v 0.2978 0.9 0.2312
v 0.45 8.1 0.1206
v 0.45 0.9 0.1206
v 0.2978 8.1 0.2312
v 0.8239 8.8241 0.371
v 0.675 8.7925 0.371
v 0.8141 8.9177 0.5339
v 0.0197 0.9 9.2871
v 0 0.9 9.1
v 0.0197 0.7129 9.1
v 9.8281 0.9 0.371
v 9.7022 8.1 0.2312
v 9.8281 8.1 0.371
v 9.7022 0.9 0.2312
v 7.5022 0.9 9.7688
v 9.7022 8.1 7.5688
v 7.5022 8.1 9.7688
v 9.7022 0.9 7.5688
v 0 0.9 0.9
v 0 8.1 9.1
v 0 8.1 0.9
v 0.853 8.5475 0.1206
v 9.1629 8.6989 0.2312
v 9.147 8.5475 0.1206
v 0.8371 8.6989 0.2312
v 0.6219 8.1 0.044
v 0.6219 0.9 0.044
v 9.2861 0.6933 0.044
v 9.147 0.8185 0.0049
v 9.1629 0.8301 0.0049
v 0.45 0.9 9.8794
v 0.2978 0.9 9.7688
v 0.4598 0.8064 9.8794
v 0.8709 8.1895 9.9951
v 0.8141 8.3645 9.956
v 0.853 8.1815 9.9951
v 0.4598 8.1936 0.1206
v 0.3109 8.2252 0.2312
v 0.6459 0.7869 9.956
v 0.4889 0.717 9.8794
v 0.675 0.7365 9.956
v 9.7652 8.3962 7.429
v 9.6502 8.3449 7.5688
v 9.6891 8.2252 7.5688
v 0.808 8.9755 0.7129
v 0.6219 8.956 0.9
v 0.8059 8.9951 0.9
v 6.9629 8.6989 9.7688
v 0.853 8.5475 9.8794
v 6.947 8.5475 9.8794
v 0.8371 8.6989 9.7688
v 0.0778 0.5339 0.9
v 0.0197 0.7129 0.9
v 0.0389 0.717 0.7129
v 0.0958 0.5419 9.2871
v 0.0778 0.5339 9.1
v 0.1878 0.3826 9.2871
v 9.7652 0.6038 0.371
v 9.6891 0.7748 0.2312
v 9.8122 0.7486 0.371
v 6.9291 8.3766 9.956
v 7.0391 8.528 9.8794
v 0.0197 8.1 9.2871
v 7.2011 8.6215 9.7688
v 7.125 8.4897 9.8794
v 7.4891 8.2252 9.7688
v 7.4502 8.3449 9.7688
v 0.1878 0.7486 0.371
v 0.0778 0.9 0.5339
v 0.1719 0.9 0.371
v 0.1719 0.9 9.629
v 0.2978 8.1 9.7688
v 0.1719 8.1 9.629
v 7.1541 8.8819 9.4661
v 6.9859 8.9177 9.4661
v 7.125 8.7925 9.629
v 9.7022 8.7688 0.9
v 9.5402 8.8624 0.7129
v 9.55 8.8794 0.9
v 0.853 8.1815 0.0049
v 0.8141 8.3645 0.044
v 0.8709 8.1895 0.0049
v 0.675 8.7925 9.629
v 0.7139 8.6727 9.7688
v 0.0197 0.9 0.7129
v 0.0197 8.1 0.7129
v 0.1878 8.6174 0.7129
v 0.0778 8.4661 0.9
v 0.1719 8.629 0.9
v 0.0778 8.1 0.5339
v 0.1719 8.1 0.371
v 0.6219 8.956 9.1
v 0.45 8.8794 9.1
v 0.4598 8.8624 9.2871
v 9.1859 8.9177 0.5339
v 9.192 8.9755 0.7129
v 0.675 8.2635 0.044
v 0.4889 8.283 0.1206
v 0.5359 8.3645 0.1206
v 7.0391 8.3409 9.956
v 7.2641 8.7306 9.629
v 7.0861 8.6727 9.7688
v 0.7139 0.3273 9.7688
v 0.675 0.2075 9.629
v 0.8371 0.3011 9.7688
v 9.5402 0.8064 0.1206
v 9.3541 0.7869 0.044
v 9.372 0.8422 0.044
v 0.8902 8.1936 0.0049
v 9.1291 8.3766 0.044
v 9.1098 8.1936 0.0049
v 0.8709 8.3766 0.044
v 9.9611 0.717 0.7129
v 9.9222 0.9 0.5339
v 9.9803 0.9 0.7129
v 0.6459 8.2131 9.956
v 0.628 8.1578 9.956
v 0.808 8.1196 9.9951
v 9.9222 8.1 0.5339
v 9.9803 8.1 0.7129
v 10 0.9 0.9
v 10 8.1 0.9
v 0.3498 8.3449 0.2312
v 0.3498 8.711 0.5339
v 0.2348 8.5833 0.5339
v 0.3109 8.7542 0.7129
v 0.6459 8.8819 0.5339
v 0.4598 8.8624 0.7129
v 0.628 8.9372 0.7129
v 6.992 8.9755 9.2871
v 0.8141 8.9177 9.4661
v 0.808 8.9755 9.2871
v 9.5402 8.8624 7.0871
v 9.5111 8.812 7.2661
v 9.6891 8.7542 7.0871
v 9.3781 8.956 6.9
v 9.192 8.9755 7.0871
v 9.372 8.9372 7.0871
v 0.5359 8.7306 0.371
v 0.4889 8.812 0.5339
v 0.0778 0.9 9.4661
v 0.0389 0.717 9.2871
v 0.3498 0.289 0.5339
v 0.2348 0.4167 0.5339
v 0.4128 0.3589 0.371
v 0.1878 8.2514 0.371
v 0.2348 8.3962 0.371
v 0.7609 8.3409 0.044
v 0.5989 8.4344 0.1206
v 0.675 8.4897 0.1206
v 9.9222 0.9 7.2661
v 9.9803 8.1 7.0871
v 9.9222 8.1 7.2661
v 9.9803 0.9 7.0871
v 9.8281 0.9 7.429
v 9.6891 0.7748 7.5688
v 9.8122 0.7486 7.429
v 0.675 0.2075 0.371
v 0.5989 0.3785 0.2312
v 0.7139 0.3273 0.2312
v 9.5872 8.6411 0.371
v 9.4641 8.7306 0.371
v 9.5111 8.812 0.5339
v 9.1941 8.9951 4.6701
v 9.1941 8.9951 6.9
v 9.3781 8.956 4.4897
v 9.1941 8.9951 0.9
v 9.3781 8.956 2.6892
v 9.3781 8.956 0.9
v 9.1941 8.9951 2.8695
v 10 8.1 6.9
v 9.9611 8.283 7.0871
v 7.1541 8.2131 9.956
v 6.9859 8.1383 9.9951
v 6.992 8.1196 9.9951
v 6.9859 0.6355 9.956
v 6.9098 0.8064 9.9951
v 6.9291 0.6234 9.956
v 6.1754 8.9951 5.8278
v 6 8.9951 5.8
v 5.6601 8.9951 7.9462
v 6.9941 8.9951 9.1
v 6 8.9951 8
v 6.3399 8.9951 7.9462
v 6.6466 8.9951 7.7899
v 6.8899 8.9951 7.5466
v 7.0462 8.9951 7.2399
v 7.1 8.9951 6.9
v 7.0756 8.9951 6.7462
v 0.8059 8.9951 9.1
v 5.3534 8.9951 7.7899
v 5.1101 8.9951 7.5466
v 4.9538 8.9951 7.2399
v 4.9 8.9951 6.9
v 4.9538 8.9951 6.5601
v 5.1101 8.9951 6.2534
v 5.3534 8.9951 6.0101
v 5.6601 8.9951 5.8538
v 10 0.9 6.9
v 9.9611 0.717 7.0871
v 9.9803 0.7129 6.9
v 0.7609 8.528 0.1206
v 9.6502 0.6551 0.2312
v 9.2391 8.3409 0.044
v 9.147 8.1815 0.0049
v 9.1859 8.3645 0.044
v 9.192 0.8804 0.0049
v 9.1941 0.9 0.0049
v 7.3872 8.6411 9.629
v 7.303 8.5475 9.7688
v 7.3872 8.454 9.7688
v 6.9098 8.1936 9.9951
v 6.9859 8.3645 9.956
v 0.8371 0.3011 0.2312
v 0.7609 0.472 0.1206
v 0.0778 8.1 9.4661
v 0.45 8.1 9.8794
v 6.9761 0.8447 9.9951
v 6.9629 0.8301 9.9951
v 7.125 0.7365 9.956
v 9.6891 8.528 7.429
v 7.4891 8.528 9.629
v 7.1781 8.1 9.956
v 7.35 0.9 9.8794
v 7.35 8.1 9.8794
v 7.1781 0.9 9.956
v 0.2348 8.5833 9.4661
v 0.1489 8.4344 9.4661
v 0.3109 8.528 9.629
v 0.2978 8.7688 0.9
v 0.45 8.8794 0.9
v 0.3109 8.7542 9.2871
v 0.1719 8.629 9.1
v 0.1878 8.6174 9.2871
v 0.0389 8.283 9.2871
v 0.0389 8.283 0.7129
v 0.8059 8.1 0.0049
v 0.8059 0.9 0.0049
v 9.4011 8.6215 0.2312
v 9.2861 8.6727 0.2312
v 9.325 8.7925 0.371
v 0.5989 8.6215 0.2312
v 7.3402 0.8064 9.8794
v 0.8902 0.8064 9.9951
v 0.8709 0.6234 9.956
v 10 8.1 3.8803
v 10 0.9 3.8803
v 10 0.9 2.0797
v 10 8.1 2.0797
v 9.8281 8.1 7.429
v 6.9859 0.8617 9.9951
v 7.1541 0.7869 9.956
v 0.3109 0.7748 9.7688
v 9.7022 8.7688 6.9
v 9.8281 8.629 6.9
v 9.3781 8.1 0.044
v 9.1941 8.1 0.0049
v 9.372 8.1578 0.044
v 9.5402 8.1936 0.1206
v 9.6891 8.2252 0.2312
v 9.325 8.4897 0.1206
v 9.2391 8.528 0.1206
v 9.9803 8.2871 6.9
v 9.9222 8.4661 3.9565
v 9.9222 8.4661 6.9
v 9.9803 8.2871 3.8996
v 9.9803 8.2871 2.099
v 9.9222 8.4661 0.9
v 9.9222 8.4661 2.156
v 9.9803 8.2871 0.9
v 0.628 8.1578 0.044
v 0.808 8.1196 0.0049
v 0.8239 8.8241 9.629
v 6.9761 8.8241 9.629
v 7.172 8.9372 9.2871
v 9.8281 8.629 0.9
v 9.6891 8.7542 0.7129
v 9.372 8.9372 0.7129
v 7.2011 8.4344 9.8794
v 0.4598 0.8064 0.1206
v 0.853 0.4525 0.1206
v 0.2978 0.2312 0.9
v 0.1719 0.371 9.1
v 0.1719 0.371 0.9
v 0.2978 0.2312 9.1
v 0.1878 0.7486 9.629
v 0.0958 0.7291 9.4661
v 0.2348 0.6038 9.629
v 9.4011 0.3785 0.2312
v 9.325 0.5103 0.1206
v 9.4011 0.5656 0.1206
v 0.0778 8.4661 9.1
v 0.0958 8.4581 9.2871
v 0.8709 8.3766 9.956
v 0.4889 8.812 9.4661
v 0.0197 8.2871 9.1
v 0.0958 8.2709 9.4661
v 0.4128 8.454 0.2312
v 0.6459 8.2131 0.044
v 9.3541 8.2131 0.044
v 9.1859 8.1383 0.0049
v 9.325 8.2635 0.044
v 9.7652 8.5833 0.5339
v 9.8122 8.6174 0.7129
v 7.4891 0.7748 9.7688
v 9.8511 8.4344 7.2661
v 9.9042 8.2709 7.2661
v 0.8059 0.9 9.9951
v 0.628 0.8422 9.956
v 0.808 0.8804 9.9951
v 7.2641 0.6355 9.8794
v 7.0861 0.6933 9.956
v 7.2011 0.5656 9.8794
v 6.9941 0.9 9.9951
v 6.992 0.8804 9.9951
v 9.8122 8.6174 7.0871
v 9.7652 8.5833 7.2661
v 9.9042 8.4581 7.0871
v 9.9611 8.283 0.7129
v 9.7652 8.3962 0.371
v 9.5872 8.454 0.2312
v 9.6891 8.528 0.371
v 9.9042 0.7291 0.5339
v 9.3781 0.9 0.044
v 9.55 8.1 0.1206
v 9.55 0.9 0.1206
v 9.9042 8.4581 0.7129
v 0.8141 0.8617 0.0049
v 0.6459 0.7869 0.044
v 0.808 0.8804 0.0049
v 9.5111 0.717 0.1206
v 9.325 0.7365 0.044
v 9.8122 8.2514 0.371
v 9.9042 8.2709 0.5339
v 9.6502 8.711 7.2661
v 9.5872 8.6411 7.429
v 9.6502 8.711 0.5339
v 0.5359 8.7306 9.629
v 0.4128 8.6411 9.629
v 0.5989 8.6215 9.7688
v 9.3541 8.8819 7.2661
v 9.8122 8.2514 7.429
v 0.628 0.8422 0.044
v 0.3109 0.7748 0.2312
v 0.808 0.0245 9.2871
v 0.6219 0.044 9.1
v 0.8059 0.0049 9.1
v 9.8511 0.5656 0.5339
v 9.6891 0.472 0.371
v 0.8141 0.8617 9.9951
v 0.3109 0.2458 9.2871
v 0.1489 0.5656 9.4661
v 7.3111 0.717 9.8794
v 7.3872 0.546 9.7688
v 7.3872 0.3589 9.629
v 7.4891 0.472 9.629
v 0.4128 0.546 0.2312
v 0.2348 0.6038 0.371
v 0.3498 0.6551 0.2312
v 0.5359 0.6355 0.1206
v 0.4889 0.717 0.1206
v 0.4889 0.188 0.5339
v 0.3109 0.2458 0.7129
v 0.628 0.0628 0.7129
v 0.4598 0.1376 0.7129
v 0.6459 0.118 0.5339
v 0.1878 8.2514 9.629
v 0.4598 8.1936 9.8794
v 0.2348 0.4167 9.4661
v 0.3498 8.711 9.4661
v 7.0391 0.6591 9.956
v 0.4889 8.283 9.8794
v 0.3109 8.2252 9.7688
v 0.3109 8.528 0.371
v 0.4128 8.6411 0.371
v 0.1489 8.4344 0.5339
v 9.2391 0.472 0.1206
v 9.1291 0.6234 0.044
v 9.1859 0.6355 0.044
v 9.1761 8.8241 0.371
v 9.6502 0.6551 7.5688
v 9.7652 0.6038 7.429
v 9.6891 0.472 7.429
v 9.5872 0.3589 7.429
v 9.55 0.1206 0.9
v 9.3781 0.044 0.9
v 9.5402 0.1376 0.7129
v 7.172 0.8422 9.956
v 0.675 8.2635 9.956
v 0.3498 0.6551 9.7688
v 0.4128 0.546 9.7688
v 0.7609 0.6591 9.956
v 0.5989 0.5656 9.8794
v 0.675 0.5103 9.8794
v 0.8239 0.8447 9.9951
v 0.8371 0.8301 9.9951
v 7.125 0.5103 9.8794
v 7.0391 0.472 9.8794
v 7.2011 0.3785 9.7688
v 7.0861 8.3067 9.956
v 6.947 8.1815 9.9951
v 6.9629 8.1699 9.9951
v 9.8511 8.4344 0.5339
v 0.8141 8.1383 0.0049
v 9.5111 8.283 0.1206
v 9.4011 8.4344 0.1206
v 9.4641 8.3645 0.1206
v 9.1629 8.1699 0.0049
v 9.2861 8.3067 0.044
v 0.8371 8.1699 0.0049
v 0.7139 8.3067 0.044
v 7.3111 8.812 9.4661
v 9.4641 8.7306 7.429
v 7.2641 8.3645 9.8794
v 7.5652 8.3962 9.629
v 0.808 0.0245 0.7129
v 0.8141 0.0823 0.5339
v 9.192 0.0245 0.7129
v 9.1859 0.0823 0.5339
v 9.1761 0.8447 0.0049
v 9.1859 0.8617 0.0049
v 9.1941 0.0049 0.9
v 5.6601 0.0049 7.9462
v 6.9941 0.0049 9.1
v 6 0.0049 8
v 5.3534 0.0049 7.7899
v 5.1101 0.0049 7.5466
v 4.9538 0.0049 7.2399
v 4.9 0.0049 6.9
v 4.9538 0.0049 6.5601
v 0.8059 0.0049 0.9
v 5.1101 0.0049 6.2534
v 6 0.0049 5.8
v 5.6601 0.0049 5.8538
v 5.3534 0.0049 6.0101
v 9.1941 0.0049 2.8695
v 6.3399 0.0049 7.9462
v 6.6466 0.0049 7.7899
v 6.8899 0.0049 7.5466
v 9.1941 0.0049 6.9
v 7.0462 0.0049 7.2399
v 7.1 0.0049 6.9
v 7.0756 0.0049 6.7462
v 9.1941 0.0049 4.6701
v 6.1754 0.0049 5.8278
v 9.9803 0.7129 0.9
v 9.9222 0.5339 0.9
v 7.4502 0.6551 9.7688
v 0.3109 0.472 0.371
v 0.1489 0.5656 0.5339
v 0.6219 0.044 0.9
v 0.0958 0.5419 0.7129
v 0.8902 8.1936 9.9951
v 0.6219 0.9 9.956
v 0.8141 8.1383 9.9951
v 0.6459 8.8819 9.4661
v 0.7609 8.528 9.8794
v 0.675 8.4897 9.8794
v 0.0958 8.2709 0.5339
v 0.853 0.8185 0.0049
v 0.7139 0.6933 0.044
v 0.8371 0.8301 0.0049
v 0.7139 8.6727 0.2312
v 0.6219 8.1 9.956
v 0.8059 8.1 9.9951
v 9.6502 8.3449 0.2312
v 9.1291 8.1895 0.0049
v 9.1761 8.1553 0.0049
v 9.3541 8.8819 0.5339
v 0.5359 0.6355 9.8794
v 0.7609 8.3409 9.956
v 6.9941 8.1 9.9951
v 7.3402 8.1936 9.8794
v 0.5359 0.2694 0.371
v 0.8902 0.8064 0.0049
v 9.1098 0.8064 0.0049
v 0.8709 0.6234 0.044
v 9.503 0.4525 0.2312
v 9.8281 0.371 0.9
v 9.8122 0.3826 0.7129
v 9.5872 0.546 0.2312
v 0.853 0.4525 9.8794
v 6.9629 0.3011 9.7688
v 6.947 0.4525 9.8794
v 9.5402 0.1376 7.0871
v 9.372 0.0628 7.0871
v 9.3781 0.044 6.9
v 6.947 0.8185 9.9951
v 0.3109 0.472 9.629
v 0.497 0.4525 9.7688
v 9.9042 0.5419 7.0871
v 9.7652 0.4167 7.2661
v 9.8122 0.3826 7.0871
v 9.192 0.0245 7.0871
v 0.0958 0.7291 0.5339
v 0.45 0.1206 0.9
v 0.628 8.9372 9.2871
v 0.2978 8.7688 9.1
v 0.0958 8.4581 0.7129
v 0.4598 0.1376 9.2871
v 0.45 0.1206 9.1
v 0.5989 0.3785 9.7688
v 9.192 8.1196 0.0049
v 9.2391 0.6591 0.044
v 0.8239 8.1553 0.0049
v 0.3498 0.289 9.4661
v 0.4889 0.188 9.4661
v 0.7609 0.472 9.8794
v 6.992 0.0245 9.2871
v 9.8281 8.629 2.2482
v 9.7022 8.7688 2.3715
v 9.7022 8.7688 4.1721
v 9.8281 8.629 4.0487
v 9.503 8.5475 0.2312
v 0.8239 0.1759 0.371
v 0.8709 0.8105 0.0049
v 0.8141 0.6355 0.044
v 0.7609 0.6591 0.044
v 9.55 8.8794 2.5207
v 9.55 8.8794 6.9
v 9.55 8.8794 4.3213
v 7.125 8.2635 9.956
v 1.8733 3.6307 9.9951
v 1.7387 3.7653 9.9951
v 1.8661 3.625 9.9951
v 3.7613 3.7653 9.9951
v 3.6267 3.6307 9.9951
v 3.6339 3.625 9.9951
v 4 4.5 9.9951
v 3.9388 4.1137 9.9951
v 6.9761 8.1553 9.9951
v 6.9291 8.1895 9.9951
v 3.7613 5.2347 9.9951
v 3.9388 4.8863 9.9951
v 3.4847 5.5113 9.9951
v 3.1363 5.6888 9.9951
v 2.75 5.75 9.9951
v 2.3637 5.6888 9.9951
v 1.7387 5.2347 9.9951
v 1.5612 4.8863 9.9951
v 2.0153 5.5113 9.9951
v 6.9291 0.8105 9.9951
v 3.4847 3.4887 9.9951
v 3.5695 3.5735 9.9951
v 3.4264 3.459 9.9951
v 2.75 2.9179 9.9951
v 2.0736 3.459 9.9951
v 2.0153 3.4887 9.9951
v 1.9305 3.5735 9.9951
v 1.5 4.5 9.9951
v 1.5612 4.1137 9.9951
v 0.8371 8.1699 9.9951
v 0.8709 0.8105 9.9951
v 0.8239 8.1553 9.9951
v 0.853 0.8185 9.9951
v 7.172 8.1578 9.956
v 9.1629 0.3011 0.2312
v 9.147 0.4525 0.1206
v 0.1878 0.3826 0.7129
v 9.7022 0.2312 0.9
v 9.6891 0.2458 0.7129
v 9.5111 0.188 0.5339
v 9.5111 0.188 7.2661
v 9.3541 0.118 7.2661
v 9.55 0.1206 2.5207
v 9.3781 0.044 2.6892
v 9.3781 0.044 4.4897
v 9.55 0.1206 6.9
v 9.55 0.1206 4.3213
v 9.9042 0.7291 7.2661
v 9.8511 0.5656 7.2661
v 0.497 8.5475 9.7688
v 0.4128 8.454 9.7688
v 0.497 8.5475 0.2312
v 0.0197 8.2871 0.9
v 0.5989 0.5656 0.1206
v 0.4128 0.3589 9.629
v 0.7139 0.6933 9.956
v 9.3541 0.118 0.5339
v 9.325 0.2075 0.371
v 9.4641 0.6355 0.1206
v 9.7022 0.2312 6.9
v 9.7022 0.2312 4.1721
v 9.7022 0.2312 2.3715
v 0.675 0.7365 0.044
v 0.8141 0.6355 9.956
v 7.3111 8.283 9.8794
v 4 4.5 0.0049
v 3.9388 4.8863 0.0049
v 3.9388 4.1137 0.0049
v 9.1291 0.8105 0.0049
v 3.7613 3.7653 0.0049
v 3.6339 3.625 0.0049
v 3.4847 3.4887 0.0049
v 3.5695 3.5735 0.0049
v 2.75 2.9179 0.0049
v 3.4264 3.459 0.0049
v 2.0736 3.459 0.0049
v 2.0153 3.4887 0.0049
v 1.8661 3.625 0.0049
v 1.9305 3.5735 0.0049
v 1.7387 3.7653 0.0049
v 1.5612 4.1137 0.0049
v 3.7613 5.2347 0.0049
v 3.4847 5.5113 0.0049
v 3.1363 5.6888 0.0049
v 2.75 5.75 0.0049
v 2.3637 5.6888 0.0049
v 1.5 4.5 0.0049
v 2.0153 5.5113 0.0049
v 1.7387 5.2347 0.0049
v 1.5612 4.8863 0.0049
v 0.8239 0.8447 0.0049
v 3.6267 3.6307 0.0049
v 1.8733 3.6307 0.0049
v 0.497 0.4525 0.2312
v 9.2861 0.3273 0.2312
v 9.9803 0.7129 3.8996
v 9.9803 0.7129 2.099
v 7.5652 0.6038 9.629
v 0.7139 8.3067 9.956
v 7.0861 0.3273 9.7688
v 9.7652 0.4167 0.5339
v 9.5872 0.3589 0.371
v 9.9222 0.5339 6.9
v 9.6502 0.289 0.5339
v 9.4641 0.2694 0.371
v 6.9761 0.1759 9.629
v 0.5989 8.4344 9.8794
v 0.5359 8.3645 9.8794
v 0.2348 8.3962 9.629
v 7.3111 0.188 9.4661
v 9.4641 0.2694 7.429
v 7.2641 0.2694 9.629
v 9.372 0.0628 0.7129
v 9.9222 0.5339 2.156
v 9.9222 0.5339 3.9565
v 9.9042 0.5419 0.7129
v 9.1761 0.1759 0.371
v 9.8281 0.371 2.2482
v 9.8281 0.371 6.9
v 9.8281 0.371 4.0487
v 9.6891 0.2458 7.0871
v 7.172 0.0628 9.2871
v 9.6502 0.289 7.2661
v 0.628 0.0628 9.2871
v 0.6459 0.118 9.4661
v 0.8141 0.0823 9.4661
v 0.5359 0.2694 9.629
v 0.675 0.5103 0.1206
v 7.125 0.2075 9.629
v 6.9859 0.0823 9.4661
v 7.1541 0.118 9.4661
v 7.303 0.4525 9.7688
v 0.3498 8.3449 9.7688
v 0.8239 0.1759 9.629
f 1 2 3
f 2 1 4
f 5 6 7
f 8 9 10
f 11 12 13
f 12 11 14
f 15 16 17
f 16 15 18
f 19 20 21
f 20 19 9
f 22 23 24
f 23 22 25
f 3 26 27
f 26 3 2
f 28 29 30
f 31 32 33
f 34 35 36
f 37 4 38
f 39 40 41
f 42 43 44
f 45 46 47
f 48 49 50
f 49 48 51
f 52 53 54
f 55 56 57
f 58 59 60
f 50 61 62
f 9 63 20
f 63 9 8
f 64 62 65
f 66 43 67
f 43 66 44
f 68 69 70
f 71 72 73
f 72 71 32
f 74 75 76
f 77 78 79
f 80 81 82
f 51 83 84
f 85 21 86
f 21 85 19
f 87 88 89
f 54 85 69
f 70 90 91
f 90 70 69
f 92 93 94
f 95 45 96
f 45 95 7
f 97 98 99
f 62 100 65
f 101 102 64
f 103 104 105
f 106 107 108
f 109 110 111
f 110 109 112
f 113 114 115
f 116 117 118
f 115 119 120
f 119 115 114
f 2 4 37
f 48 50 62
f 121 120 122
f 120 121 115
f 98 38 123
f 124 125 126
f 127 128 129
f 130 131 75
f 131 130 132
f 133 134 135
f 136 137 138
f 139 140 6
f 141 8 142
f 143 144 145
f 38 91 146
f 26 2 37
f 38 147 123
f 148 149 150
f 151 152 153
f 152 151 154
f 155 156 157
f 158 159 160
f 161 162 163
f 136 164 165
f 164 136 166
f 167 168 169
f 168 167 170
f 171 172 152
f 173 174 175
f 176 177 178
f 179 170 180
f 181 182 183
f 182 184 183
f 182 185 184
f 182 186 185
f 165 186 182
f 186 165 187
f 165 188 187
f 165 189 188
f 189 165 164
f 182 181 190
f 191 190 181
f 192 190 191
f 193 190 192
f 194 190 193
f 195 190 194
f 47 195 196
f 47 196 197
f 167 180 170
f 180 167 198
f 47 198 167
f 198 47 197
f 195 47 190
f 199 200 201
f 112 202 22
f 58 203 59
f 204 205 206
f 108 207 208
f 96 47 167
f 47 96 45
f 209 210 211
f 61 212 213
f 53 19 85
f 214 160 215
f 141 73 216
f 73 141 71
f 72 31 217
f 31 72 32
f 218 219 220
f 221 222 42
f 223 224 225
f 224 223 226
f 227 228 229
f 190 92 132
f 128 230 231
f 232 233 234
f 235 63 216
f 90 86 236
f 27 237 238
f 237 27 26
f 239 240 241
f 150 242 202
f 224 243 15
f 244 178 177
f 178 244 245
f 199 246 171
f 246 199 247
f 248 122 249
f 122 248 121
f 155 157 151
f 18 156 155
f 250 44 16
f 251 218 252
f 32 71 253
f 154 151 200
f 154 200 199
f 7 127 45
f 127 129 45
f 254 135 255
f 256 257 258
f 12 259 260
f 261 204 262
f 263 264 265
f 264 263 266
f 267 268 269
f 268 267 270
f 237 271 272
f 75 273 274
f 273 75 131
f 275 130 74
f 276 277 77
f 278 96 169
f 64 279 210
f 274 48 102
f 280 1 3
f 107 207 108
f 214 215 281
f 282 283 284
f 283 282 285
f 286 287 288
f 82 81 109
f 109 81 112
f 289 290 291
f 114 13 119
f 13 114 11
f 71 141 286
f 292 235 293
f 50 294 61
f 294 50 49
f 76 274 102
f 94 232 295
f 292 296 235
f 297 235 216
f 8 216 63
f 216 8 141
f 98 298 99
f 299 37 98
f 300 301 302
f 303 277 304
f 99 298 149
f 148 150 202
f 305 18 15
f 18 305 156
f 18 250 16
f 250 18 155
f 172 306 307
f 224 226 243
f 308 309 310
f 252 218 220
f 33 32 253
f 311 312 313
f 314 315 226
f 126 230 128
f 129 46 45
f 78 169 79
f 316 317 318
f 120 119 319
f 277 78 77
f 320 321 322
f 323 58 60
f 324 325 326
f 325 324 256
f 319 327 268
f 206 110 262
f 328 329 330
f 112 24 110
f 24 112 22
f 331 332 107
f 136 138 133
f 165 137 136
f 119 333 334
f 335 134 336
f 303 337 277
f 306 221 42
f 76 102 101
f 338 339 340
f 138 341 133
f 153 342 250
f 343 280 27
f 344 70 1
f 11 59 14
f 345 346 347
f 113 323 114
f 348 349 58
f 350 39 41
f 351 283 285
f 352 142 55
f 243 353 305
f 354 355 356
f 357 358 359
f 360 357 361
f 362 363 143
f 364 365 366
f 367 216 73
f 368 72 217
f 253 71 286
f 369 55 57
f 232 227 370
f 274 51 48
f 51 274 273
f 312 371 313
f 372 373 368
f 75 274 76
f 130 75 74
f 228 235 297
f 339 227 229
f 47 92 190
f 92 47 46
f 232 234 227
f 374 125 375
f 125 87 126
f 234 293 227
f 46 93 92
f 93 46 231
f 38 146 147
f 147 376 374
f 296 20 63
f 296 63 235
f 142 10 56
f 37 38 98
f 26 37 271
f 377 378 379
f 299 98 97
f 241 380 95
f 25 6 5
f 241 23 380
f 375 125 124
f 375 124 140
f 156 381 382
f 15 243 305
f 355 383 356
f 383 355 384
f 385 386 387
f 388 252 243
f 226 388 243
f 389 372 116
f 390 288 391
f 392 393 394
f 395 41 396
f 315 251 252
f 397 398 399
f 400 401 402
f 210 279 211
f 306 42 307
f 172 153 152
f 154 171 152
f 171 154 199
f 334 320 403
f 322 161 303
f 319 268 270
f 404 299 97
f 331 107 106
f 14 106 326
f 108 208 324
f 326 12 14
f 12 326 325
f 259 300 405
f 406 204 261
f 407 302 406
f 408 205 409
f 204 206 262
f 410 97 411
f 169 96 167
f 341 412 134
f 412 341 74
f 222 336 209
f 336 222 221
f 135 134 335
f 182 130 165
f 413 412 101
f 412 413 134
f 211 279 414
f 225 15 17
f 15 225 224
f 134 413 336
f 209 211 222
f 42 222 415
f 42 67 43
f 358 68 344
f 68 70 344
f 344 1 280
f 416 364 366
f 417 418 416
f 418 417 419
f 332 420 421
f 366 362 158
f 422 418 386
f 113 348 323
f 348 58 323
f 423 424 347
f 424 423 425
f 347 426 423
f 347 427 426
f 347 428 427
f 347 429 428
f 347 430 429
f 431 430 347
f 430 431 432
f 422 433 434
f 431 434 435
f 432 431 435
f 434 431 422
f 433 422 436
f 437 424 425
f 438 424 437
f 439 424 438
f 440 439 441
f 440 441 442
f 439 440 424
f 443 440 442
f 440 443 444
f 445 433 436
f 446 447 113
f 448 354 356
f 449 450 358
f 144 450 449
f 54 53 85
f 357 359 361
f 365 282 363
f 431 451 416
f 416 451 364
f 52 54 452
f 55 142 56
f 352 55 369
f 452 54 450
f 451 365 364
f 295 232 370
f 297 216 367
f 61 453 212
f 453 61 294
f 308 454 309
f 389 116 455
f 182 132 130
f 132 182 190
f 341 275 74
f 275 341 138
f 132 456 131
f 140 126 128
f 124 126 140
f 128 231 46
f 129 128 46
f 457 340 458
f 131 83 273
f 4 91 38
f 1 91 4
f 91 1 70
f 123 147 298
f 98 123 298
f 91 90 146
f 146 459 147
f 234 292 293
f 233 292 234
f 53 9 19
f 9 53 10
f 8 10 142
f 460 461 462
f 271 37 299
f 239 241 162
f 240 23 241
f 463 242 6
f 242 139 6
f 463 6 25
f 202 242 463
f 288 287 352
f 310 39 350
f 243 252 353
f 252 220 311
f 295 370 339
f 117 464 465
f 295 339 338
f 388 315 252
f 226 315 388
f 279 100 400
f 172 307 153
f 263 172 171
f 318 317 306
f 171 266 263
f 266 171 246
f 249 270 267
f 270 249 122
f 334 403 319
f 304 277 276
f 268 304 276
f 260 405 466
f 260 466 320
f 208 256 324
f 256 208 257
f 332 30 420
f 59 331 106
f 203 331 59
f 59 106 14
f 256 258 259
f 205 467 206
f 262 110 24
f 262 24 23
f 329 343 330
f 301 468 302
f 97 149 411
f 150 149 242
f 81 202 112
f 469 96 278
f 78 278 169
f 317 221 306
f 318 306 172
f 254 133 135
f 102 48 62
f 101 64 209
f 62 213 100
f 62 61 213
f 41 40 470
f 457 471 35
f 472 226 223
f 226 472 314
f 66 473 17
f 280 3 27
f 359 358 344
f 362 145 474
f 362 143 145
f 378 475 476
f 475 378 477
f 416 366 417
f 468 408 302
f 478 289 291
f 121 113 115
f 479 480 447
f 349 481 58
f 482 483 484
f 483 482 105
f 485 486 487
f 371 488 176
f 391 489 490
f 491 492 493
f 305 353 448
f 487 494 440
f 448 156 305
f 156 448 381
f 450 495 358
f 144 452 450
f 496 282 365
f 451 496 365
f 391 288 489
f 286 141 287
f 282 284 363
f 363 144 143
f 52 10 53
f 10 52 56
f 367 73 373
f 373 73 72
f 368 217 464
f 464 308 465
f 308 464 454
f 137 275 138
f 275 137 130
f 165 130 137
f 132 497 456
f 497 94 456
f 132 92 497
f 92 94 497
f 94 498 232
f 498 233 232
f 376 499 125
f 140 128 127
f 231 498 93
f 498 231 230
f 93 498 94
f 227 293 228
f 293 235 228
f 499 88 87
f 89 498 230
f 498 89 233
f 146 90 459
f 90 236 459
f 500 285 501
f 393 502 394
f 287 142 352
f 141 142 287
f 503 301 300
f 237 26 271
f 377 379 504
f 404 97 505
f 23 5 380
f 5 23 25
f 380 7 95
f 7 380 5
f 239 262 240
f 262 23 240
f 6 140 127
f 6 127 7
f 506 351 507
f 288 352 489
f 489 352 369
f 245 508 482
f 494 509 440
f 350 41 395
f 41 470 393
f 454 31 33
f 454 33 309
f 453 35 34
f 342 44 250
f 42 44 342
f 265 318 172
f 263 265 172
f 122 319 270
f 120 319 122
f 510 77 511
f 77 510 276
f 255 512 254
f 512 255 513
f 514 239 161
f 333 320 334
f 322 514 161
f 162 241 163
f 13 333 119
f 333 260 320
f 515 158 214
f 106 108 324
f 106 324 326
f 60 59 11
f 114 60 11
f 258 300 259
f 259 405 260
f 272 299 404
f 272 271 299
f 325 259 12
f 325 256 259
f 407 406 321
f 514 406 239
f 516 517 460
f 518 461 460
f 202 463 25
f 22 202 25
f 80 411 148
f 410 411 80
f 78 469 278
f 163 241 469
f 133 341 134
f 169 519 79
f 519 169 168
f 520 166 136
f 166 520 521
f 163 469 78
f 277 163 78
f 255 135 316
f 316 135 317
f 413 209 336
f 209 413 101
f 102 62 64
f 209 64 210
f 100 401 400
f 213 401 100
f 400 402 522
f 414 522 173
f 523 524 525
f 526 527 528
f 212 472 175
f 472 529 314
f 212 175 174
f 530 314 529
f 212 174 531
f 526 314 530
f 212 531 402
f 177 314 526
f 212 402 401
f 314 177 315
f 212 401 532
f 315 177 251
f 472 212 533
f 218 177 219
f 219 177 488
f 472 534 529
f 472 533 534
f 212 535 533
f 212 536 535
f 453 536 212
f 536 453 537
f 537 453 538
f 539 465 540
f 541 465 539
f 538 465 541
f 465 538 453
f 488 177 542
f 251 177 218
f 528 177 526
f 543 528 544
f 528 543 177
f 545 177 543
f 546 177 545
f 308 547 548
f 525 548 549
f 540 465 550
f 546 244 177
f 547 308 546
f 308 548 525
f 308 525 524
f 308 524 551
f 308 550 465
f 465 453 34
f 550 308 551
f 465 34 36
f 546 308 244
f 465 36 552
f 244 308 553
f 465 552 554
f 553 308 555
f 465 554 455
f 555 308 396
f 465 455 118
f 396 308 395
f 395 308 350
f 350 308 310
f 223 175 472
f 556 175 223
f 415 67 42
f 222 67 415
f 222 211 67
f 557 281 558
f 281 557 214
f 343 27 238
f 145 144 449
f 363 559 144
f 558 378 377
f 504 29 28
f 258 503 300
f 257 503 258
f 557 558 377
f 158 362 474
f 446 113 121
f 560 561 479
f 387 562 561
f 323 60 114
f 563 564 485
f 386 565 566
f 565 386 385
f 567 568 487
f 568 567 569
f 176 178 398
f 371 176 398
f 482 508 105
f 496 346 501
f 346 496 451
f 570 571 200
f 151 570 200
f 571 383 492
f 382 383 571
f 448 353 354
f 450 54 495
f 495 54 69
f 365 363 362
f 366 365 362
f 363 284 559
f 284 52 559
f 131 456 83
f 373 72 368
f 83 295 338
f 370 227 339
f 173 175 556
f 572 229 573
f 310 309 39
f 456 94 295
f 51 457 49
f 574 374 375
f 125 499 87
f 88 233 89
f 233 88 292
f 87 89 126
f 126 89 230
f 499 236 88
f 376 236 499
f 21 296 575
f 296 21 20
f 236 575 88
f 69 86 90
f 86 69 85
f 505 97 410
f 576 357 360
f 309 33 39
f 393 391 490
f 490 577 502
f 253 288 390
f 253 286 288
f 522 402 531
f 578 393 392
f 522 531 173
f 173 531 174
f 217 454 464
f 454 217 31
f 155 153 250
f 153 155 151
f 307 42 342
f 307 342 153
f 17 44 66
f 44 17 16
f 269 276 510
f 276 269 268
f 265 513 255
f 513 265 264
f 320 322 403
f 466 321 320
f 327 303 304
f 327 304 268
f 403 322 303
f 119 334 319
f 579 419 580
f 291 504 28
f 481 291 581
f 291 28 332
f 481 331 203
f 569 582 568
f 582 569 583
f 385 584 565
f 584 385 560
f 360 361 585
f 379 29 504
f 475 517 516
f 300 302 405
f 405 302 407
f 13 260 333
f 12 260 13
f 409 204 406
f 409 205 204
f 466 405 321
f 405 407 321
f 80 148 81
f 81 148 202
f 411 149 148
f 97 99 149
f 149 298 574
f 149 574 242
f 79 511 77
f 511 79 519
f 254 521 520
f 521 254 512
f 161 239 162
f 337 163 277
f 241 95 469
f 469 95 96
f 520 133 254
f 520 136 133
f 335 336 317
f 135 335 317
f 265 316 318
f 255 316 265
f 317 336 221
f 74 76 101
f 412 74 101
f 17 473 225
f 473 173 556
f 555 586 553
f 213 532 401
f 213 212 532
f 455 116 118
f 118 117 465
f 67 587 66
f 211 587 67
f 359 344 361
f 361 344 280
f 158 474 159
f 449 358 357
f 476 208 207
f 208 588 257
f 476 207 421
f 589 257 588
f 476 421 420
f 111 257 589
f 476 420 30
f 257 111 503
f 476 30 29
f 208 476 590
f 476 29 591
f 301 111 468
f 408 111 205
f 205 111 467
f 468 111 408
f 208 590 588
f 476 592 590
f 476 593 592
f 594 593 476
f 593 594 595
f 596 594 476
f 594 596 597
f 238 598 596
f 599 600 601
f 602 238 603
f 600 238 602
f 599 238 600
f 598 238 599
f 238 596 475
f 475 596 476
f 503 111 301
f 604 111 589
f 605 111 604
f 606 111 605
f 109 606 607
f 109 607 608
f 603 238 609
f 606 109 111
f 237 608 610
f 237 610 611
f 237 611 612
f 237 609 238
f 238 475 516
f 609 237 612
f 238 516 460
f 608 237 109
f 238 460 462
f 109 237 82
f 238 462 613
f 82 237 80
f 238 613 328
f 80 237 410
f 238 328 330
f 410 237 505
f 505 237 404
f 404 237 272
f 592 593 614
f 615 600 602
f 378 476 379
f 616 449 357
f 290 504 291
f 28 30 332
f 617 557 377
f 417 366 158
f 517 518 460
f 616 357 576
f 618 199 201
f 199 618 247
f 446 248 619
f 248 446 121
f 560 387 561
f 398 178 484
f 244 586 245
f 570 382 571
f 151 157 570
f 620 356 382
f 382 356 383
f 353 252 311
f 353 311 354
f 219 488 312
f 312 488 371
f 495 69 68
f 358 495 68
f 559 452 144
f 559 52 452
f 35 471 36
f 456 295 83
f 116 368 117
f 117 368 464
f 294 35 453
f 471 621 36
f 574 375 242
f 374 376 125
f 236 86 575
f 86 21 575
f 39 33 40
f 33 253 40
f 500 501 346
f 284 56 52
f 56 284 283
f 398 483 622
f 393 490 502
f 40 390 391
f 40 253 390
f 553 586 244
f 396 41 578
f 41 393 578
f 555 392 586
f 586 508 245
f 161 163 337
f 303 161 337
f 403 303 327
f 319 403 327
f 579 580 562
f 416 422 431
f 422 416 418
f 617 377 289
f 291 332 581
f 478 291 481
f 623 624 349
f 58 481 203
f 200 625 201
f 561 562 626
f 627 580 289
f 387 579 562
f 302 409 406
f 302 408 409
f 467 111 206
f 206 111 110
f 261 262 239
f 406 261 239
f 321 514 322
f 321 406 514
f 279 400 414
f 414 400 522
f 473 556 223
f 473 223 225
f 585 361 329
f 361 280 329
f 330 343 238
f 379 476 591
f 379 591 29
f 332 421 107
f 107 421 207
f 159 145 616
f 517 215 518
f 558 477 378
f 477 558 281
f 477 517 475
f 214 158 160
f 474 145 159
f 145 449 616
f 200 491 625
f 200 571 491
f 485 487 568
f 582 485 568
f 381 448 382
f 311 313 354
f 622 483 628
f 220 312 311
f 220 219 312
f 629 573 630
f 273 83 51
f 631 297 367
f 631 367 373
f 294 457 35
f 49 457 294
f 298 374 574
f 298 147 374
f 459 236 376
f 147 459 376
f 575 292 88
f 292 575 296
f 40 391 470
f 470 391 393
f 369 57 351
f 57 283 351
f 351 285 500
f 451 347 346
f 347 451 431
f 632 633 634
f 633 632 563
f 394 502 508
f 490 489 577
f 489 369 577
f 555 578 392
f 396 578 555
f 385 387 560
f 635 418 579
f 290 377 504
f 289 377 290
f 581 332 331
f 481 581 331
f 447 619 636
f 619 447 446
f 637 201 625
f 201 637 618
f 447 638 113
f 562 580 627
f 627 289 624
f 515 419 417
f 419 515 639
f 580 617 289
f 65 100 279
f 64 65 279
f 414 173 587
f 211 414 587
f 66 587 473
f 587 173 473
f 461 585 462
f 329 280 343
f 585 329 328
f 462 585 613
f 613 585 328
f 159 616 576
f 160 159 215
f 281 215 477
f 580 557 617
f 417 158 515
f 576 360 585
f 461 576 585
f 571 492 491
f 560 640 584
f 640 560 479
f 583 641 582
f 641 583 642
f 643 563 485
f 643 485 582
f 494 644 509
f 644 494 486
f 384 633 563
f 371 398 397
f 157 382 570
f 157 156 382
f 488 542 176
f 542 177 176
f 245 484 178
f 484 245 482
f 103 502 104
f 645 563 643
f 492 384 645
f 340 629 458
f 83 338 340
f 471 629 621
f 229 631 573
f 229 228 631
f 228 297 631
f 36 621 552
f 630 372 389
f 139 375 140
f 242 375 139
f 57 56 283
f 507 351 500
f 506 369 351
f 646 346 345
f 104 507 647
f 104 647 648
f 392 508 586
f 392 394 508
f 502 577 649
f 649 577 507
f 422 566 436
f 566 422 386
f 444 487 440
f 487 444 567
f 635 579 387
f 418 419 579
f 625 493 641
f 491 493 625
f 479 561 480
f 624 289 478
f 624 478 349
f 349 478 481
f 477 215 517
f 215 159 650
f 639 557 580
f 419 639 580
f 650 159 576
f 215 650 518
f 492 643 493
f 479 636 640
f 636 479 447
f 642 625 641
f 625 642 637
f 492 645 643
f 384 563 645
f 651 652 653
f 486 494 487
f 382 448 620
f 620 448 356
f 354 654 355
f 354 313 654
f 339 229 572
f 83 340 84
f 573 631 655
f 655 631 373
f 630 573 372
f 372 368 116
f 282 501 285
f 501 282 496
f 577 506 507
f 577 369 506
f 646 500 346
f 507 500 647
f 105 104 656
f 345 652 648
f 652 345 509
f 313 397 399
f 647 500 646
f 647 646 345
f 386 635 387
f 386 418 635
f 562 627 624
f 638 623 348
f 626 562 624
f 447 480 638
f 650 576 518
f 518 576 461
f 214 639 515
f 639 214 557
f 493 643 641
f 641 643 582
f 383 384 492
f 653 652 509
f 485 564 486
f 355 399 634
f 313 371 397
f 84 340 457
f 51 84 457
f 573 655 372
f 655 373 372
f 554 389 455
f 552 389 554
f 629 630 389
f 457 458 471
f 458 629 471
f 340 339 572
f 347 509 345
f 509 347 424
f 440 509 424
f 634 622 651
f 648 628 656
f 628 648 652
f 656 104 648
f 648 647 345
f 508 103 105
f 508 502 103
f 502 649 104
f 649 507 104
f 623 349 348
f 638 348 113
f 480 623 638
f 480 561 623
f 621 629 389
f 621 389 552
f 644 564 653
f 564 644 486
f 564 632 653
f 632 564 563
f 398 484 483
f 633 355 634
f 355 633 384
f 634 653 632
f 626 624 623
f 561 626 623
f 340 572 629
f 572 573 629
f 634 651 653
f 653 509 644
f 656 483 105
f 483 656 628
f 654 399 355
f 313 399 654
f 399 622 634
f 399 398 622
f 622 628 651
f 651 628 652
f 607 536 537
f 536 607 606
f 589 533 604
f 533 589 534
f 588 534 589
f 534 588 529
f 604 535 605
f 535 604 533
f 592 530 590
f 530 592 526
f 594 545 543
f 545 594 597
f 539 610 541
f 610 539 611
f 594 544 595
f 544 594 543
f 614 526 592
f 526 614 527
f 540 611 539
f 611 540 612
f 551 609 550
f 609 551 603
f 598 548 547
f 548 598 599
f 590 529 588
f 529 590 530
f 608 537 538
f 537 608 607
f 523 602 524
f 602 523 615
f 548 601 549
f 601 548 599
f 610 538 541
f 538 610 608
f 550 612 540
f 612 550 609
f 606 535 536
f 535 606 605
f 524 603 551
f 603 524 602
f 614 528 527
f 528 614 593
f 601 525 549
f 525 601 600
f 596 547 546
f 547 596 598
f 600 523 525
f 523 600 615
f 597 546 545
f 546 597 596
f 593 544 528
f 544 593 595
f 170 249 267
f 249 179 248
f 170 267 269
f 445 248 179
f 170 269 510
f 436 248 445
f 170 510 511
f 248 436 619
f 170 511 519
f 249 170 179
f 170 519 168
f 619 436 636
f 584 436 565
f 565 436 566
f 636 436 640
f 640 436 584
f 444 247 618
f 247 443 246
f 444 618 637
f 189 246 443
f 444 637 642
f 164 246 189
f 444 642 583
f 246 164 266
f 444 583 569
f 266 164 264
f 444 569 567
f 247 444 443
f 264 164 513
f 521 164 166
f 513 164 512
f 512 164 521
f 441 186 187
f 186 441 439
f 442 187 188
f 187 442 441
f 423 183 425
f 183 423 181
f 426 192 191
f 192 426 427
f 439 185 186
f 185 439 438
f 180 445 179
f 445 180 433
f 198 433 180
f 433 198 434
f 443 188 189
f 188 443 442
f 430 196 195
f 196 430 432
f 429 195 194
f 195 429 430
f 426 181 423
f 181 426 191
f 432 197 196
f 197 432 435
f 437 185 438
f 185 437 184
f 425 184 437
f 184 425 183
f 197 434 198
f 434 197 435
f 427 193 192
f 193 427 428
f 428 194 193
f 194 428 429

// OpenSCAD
//***********************************
//     Lipo Battery Holder for Diatone 250 FPV    *
//          Henning Stöcklein 25.10.2015            *
//          Free for Non-commercial Use             *
//***********************************

// Base Block Size X
cx = 10 ; // [7:15] 

// Base Block Size Y
cy = 9 ; // [7:15]

// Base Block Height
ch = 10 ; // [7:15]

// Type of Block Chamfer
chamfer_type = 2 ; // [0:None, 1:2D-Chamfer, 2:3D-Chamfer]

//  Block Chamfer Radius
rCham = 0.9 ;

// Block Ramp Cutout (only 3D chamfer)
ramp = 2.2 ; 

// M3 Thread Core Diameter
rM3 = 2.5 ;

// Ruber Slot Position X
slot_x = -0.5 ;

// Ruber Slot Position Z
slot_z = 0.4 ;

// Rubber Slot Width
rRub1 = 0.65 ; 

// Rubber Slot End Hole Diameter
rRub2 = 2.2 ;

//*********  End of Customizing Area******************

module roundcube (x, y, z, rad)
{
    hull() {
      translate ([rad,rad,0]) cylinder (r=rad,h=z, $fn=30) ;
      translate ([rad, y-rad, 0]) cylinder (r=rad,h=z, $fn=30) ;
      translate ([x-rad, rad, 0]) cylinder (r=rad,h=z, $fn=30) ;
      translate ([x-rad, y-rad, 0]) cylinder (r=rad,h=z, $fn=30) ;
    }
}

module ballcube (x, y, z, rad)
{
    hull() {
      translate ([rad,rad,rad]) sphere (r=rad, $fn=30) ;
      translate ([rad, y-rad, rad]) sphere (r=rad, $fn=30) ;
      translate ([x-rad, rad, rad]) sphere (r=rad, $fn=30) ;
      translate ([x-rad, y-rad, rad]) sphere (r=rad, $fn=30) ;

      translate ([rad,rad,z-rad]) sphere (r=rad, $fn=30) ;
      translate ([rad, y-rad, z-rad]) sphere (r=rad, $fn=30) ;
      translate ([x-rad-ramp, rad, z-rad]) sphere (r=rad, $fn=30) ;
      translate ([x-rad-ramp, y-rad, z-rad]) sphere (r=rad, $fn=30) ;
      translate ([x-rad, rad, z-rad-ramp]) sphere (r=rad, $fn=30) ;
      translate ([x-rad, y-rad, z-rad-ramp]) sphere (r=rad, $fn=30) ;
    }
}

module holder ()
{
    difference () 
    {
       // Basic Cube with 2D or 3D chamfers
       if (chamfer_type == 0) { cube ([cx, cy, ch]) ; }
       if (chamfer_type == 1) { roundcube (cx, cy, ch, rCham) ; }
       if (chamfer_type == 2) { ballcube (cx, cy, ch, rCham) ; }

        // M3 Screw hole and hole extension for support-free printing
        translate ([1.5+rM3/2,cy/2,0]) cylinder (r=rM3/2, h=50, $fn=20) ;
        translate ([1.5+rM3/2,cy/2-rM3/2*0.7,0]) 
               scale ([1,0.8,1]) rotate ([0,0,45]) cube ([rM3/2,rM3/2,50], center=true ) ;
 
        // Slot for Rubber
        translate ([cx*0.65,cy,ch*0.65]) 
            hull() {
              translate ([slot_x,0,slot_z]) rotate ([90,0,0]) cylinder (r=rRub1, h=cy, $fn=20) ;
              translate ([4.5,0,-4.5]) rotate ([90,0,0]) cylinder (r=rRub1, h=cy, $fn=20) ;
           } // hull
           
        // Hole at end of Rubber slot
        translate ([cx*0.65+slot_x,cy,ch*0.65+slot_z]) rotate ([90,0,0]) cylinder (r=rRub2/2, h=cy, $fn=20) ;
    }
}

holder() ;
